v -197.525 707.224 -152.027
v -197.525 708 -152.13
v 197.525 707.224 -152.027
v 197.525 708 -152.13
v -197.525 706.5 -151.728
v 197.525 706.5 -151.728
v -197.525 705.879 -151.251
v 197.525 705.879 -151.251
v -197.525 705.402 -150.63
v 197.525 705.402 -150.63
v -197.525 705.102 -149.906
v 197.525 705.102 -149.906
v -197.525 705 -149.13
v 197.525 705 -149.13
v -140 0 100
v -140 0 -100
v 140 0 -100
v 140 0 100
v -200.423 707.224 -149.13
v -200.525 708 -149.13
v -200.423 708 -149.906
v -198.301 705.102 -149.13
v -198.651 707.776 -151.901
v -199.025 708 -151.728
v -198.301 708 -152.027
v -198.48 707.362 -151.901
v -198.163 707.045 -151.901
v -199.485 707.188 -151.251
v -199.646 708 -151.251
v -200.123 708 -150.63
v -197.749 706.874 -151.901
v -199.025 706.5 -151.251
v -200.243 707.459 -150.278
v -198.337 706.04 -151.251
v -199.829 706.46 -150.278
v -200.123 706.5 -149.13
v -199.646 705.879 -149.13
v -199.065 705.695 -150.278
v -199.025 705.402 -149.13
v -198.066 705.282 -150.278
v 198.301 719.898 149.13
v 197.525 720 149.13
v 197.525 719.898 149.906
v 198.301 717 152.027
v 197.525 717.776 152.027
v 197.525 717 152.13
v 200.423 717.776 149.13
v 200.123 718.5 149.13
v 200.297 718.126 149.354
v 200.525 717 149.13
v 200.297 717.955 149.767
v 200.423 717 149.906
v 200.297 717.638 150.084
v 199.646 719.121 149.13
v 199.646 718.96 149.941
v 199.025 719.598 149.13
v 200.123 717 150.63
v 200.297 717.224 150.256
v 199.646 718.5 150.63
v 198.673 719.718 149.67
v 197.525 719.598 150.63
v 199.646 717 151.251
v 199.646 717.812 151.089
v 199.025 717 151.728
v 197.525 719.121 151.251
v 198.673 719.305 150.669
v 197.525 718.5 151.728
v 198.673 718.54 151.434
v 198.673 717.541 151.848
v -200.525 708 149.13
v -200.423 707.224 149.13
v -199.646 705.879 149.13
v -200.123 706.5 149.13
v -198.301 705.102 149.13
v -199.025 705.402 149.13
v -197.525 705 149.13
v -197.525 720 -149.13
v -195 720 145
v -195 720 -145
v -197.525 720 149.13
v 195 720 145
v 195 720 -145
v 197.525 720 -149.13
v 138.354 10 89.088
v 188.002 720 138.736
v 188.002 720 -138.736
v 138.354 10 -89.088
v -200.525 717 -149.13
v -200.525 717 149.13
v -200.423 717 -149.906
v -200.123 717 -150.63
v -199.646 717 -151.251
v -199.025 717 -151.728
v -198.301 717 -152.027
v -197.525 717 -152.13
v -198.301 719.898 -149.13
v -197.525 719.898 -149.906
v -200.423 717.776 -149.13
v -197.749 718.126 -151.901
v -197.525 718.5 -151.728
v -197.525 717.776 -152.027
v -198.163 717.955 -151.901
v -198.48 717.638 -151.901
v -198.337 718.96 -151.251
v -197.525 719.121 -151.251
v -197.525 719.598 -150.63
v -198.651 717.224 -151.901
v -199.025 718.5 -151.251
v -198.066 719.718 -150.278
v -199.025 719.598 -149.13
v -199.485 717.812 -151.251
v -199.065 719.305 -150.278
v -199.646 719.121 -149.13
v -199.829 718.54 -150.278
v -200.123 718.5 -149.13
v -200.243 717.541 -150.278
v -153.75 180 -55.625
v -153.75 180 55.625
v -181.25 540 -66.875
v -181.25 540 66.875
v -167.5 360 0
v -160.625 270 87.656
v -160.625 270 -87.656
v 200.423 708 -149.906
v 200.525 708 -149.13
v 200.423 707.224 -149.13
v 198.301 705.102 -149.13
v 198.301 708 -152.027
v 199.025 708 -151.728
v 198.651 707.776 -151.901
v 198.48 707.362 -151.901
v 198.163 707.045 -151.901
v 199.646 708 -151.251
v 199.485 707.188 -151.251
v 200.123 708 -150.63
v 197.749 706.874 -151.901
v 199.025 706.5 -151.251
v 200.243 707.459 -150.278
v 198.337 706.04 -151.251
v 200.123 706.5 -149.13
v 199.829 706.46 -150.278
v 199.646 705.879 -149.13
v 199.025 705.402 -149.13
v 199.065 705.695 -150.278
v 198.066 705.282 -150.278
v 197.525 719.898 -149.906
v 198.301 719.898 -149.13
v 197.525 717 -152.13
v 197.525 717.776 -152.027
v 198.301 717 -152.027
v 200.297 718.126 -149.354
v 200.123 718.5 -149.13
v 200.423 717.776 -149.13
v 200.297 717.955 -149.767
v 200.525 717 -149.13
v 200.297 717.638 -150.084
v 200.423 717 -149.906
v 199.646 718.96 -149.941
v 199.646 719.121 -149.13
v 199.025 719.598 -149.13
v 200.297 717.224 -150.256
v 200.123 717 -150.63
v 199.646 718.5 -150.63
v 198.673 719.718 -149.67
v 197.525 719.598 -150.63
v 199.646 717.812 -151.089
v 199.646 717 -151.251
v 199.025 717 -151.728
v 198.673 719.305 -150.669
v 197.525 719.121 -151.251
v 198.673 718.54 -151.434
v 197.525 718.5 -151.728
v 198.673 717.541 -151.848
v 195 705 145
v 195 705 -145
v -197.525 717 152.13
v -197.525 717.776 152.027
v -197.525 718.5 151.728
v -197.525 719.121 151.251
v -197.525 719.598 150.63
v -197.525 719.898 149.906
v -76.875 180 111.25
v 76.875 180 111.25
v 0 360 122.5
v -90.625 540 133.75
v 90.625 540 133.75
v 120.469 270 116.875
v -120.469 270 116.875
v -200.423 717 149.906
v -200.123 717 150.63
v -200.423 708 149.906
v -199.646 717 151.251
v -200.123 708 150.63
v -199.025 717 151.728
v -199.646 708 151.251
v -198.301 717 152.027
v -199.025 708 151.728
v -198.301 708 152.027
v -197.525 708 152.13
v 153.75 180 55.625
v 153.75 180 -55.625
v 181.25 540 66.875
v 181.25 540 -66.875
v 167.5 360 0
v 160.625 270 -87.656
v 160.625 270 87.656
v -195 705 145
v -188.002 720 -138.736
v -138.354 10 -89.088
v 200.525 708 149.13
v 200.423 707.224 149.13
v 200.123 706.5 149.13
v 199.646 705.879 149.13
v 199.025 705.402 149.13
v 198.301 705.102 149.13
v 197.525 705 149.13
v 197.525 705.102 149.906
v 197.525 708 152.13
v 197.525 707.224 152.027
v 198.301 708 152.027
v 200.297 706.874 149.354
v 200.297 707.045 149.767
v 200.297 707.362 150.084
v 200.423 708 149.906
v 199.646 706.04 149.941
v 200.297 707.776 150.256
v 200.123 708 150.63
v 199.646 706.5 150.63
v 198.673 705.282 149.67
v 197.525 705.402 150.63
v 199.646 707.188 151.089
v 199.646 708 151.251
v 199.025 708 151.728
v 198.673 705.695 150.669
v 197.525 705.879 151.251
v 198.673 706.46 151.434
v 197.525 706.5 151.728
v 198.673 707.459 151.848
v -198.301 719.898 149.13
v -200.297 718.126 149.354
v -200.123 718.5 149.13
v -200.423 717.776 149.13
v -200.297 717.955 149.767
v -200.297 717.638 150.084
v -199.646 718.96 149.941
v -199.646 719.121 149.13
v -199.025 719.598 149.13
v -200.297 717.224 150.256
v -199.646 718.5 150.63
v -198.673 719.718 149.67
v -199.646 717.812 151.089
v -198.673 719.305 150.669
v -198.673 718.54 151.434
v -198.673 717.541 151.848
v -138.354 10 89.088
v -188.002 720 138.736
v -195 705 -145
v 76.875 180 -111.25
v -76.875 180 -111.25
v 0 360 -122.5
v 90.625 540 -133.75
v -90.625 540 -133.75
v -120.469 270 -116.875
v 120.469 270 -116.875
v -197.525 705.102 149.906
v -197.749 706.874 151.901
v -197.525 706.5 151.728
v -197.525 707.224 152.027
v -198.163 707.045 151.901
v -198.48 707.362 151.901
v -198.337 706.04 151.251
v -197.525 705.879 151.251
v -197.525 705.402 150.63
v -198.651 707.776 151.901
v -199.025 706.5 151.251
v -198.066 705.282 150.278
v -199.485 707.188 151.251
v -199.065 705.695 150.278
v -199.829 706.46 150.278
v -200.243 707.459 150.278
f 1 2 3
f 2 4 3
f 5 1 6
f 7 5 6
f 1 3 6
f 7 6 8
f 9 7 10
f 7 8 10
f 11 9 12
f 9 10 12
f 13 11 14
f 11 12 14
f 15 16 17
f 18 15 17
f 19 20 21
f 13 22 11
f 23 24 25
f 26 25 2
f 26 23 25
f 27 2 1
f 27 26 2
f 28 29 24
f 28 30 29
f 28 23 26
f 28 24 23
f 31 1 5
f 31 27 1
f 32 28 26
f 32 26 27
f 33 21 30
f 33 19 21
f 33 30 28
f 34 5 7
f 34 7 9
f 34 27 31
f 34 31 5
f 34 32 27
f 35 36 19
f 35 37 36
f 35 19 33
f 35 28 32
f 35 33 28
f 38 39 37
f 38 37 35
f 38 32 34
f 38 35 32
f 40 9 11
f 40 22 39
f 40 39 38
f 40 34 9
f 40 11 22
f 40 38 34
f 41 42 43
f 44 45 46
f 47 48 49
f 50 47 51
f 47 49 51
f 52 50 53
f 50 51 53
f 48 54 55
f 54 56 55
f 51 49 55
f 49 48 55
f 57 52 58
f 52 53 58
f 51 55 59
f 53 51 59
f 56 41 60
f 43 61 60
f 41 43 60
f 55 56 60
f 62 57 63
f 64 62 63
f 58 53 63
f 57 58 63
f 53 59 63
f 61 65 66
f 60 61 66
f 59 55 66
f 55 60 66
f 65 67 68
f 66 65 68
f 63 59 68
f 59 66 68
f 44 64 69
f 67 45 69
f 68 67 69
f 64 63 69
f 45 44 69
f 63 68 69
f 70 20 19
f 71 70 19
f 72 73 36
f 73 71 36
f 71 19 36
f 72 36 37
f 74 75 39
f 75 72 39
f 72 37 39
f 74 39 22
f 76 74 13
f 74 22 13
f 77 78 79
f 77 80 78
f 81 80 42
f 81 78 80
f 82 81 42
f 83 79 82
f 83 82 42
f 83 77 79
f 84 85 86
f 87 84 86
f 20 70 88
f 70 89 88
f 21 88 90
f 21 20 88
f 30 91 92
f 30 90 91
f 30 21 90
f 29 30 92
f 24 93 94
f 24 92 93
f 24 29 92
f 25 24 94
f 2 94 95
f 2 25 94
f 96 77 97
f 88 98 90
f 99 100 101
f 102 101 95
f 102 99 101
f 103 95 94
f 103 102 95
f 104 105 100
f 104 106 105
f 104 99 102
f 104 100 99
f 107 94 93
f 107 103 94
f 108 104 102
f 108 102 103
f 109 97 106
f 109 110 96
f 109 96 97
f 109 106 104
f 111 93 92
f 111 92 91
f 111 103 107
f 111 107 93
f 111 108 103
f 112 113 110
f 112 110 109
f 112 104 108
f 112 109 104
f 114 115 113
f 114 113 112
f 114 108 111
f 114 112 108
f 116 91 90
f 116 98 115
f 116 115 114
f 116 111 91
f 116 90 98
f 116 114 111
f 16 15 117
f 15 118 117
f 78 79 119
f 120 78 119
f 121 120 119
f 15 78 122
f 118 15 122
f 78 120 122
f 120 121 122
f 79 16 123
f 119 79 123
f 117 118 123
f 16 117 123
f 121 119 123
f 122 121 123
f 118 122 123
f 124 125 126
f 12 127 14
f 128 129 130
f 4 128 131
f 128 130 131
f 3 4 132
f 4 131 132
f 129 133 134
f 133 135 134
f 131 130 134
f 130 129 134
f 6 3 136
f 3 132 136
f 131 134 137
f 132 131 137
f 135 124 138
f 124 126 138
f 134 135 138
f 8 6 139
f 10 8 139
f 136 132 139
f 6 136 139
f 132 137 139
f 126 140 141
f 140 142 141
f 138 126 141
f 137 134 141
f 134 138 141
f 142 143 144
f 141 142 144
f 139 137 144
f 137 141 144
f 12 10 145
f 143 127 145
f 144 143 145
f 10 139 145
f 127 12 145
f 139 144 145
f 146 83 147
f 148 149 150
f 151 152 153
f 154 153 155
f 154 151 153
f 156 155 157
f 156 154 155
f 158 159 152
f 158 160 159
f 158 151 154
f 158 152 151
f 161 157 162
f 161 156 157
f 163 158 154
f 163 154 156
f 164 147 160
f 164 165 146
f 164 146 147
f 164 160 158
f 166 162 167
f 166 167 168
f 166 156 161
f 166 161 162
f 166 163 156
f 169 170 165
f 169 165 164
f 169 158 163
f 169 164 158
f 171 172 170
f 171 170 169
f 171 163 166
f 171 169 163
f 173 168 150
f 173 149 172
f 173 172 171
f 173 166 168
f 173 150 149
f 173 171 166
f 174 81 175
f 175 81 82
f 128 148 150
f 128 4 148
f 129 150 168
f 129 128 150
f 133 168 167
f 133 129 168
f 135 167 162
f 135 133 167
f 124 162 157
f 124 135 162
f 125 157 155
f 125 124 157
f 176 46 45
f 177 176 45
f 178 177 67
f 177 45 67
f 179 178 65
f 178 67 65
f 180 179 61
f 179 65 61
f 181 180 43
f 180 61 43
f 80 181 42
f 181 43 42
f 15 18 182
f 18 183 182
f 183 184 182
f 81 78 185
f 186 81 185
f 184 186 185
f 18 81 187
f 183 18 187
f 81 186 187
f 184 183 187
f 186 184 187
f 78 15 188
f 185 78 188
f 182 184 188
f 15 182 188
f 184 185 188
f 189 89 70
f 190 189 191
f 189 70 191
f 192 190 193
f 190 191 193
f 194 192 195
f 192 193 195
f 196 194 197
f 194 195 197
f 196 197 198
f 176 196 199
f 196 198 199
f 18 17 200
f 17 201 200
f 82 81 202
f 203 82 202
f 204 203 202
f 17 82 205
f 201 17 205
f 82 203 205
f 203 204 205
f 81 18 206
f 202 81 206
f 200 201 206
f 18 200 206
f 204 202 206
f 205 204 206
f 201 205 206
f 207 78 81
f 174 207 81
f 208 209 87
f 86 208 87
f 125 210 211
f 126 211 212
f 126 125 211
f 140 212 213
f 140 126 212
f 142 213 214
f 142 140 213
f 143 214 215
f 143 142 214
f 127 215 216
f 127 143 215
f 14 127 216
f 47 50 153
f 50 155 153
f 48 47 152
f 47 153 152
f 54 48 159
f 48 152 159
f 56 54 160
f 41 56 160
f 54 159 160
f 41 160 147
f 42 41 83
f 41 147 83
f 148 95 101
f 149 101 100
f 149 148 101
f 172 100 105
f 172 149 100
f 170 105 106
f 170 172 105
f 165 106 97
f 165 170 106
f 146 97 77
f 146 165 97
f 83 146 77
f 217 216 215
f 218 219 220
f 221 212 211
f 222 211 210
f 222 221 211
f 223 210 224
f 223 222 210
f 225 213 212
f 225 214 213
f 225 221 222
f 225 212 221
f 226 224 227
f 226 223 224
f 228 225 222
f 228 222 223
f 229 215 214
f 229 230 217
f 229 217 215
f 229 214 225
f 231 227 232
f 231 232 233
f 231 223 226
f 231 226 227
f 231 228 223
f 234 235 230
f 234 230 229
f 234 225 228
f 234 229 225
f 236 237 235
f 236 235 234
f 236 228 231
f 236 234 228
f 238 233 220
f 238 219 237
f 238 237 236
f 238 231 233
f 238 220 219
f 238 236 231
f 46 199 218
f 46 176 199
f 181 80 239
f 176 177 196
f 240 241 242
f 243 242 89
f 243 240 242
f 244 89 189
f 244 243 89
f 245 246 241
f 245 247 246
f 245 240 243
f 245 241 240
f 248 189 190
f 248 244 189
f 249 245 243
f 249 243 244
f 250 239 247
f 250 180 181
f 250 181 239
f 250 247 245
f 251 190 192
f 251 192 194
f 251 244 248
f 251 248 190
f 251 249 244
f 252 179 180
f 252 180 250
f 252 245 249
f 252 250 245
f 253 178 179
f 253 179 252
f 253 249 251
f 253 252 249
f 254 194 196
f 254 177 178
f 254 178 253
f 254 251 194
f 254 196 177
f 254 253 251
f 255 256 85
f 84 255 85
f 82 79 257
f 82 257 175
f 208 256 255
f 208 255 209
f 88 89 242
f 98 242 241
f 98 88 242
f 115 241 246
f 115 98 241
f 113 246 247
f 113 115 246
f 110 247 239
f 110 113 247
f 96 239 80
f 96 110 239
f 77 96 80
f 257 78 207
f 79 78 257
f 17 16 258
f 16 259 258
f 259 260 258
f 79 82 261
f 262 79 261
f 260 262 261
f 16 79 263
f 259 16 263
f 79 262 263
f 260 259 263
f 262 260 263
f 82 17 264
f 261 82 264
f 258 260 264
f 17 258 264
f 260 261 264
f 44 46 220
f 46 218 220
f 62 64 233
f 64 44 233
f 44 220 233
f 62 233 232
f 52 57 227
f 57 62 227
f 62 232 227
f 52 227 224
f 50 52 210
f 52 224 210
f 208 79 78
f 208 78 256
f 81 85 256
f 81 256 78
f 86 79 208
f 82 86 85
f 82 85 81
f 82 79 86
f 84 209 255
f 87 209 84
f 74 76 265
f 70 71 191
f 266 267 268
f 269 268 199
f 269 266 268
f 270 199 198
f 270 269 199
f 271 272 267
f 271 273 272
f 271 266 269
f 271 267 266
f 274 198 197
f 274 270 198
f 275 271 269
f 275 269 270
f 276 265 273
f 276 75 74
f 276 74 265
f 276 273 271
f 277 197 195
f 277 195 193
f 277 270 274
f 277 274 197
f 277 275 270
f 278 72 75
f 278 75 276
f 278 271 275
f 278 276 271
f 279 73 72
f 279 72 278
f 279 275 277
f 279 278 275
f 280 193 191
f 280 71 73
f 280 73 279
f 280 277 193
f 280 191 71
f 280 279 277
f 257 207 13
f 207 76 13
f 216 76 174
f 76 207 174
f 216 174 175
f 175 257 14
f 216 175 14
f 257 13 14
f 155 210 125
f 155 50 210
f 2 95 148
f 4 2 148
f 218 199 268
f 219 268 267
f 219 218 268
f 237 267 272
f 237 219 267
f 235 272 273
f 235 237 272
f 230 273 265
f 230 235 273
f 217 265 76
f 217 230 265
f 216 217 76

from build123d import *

# Parameters (mm, degrees)
CROQUIS1_W              = 280
CROQUIS1_H              = 200
SALIENTE_EXTRUIR1_DEPTH = 10
CROQUIS3_W              = 376.00434192
CROQUIS3_H              = 277.471683716
CORTAR_EXTRUIR1_DEPTH   = 710
CORTAR_EXTRUIR1_DRAFT   = -4
CROQUIS4_W              = 401.049923566
CROQUIS4_H              = 304.259280942
CROQUIS4_W_2            = 390
CROQUIS4_H_2            = 290
SALIENTE_EXTRUIR2_DEPTH = 15
REDONDEO1_R             = 3


with BuildPart() as part:
    # Croquis1 → Saliente-Extruir1 (new body)
    with BuildSketch(Plane(origin=(0, 0, 0), x_dir=(1, 0, 0), z_dir=(0, 1, 0))):
        Rectangle(CROQUIS1_W, CROQUIS1_H)
    extrude(amount=SALIENTE_EXTRUIR1_DEPTH)

    # Croquis1<2> → Recubrir2 section 0
    with BuildSketch(Plane(origin=(0, 0, 0), x_dir=(1, 0, 0), z_dir=(0, 1, 0))):
        with BuildLine():
            Line((-140, 100), (140, 100))
            Line((140, 100), (140, -100))
            Line((140, -100), (-140, -100))
            Line((-140, -100), (-140, 100))
        make_face()
    # Croquis2 → Recubrir2 section 1
    with BuildSketch(Plane(origin=(0, 720, 0), x_dir=(1, 0, 0), z_dir=(0, 1, 0))):
        with BuildLine():
            Line((-195, 145), (195, 145))
            Line((195, 145), (195, -145))
            Line((195, -145), (-195, -145))
            Line((-195, -145), (-195, 145))
        make_face()
    loft()


with BuildPart() as cortar_extruir1_tool:
    # Croquis3 → Cortar-Extruir1 (with draft: the straight prism first)
    with BuildSketch(Plane(origin=(0, 720, 0), x_dir=(1, 0, 0), z_dir=(0, 1, 0))):
        Rectangle(CROQUIS3_W, CROQUIS3_H)
    extrude(amount=-CORTAR_EXTRUIR1_DEPTH)
    # Cortar-Extruir1: the draft: its side faces are tilted about the plane it starts from
    cortar_extruir1_sides = [cortar_extruir1_tool.faces().sort_by_distance(p)[0] for p in [
        (-188.00217096, 365, 0),
        (0, 365, 138.735841858),
        (188.00217096, 365, 0),
        (0, 365, -138.735841858),
    ]]
    draft(cortar_extruir1_sides, Plane(origin=(0, 720, 0), x_dir=(1, 0, 0), z_dir=(0, 1, 0)), CORTAR_EXTRUIR1_DRAFT)


with BuildPart() as part_1:
    add(part.part)

    # Cortar-Extruir1: cut by cortar_extruir1_tool
    add(cortar_extruir1_tool.part, mode=Mode.SUBTRACT)


with BuildPart() as body_2:
    # Croquis4 → Saliente-Extruir2 (new body)
    with BuildSketch(Plane(origin=(0, 720, 0), x_dir=(1, 0, 0), z_dir=(0, 1, 0))):
        Rectangle(CROQUIS4_W, CROQUIS4_H)
        Rectangle(CROQUIS4_W_2, CROQUIS4_H_2, mode=Mode.SUBTRACT)
    extrude(amount=-SALIENTE_EXTRUIR2_DEPTH)

    # Redondeo1
    redondeo1_edges = [body_2.edges().sort_by_distance(p)[0] for p in [
        (-200.524961783, 705, 0),
        (0, 705, 152.129640471),
        (200.524961783, 705, 0),
        (0, 720, 152.129640471),
        (-200.524961783, 720, 0),
        (0, 720, -152.129640471),
        (200.524961783, 720, 0),
        (200.524961783, 712.5, 152.129640471),
        (-200.524961783, 712.5, 152.129640471),
        (-200.524961783, 712.5, -152.129640471),
        (200.524961783, 712.5, -152.129640471),
        (0, 705, -152.129640471),
    ]]
    fillet(redondeo1_edges, radius=REDONDEO1_R)


solid = Compound([part_1.part, body_2.part])
